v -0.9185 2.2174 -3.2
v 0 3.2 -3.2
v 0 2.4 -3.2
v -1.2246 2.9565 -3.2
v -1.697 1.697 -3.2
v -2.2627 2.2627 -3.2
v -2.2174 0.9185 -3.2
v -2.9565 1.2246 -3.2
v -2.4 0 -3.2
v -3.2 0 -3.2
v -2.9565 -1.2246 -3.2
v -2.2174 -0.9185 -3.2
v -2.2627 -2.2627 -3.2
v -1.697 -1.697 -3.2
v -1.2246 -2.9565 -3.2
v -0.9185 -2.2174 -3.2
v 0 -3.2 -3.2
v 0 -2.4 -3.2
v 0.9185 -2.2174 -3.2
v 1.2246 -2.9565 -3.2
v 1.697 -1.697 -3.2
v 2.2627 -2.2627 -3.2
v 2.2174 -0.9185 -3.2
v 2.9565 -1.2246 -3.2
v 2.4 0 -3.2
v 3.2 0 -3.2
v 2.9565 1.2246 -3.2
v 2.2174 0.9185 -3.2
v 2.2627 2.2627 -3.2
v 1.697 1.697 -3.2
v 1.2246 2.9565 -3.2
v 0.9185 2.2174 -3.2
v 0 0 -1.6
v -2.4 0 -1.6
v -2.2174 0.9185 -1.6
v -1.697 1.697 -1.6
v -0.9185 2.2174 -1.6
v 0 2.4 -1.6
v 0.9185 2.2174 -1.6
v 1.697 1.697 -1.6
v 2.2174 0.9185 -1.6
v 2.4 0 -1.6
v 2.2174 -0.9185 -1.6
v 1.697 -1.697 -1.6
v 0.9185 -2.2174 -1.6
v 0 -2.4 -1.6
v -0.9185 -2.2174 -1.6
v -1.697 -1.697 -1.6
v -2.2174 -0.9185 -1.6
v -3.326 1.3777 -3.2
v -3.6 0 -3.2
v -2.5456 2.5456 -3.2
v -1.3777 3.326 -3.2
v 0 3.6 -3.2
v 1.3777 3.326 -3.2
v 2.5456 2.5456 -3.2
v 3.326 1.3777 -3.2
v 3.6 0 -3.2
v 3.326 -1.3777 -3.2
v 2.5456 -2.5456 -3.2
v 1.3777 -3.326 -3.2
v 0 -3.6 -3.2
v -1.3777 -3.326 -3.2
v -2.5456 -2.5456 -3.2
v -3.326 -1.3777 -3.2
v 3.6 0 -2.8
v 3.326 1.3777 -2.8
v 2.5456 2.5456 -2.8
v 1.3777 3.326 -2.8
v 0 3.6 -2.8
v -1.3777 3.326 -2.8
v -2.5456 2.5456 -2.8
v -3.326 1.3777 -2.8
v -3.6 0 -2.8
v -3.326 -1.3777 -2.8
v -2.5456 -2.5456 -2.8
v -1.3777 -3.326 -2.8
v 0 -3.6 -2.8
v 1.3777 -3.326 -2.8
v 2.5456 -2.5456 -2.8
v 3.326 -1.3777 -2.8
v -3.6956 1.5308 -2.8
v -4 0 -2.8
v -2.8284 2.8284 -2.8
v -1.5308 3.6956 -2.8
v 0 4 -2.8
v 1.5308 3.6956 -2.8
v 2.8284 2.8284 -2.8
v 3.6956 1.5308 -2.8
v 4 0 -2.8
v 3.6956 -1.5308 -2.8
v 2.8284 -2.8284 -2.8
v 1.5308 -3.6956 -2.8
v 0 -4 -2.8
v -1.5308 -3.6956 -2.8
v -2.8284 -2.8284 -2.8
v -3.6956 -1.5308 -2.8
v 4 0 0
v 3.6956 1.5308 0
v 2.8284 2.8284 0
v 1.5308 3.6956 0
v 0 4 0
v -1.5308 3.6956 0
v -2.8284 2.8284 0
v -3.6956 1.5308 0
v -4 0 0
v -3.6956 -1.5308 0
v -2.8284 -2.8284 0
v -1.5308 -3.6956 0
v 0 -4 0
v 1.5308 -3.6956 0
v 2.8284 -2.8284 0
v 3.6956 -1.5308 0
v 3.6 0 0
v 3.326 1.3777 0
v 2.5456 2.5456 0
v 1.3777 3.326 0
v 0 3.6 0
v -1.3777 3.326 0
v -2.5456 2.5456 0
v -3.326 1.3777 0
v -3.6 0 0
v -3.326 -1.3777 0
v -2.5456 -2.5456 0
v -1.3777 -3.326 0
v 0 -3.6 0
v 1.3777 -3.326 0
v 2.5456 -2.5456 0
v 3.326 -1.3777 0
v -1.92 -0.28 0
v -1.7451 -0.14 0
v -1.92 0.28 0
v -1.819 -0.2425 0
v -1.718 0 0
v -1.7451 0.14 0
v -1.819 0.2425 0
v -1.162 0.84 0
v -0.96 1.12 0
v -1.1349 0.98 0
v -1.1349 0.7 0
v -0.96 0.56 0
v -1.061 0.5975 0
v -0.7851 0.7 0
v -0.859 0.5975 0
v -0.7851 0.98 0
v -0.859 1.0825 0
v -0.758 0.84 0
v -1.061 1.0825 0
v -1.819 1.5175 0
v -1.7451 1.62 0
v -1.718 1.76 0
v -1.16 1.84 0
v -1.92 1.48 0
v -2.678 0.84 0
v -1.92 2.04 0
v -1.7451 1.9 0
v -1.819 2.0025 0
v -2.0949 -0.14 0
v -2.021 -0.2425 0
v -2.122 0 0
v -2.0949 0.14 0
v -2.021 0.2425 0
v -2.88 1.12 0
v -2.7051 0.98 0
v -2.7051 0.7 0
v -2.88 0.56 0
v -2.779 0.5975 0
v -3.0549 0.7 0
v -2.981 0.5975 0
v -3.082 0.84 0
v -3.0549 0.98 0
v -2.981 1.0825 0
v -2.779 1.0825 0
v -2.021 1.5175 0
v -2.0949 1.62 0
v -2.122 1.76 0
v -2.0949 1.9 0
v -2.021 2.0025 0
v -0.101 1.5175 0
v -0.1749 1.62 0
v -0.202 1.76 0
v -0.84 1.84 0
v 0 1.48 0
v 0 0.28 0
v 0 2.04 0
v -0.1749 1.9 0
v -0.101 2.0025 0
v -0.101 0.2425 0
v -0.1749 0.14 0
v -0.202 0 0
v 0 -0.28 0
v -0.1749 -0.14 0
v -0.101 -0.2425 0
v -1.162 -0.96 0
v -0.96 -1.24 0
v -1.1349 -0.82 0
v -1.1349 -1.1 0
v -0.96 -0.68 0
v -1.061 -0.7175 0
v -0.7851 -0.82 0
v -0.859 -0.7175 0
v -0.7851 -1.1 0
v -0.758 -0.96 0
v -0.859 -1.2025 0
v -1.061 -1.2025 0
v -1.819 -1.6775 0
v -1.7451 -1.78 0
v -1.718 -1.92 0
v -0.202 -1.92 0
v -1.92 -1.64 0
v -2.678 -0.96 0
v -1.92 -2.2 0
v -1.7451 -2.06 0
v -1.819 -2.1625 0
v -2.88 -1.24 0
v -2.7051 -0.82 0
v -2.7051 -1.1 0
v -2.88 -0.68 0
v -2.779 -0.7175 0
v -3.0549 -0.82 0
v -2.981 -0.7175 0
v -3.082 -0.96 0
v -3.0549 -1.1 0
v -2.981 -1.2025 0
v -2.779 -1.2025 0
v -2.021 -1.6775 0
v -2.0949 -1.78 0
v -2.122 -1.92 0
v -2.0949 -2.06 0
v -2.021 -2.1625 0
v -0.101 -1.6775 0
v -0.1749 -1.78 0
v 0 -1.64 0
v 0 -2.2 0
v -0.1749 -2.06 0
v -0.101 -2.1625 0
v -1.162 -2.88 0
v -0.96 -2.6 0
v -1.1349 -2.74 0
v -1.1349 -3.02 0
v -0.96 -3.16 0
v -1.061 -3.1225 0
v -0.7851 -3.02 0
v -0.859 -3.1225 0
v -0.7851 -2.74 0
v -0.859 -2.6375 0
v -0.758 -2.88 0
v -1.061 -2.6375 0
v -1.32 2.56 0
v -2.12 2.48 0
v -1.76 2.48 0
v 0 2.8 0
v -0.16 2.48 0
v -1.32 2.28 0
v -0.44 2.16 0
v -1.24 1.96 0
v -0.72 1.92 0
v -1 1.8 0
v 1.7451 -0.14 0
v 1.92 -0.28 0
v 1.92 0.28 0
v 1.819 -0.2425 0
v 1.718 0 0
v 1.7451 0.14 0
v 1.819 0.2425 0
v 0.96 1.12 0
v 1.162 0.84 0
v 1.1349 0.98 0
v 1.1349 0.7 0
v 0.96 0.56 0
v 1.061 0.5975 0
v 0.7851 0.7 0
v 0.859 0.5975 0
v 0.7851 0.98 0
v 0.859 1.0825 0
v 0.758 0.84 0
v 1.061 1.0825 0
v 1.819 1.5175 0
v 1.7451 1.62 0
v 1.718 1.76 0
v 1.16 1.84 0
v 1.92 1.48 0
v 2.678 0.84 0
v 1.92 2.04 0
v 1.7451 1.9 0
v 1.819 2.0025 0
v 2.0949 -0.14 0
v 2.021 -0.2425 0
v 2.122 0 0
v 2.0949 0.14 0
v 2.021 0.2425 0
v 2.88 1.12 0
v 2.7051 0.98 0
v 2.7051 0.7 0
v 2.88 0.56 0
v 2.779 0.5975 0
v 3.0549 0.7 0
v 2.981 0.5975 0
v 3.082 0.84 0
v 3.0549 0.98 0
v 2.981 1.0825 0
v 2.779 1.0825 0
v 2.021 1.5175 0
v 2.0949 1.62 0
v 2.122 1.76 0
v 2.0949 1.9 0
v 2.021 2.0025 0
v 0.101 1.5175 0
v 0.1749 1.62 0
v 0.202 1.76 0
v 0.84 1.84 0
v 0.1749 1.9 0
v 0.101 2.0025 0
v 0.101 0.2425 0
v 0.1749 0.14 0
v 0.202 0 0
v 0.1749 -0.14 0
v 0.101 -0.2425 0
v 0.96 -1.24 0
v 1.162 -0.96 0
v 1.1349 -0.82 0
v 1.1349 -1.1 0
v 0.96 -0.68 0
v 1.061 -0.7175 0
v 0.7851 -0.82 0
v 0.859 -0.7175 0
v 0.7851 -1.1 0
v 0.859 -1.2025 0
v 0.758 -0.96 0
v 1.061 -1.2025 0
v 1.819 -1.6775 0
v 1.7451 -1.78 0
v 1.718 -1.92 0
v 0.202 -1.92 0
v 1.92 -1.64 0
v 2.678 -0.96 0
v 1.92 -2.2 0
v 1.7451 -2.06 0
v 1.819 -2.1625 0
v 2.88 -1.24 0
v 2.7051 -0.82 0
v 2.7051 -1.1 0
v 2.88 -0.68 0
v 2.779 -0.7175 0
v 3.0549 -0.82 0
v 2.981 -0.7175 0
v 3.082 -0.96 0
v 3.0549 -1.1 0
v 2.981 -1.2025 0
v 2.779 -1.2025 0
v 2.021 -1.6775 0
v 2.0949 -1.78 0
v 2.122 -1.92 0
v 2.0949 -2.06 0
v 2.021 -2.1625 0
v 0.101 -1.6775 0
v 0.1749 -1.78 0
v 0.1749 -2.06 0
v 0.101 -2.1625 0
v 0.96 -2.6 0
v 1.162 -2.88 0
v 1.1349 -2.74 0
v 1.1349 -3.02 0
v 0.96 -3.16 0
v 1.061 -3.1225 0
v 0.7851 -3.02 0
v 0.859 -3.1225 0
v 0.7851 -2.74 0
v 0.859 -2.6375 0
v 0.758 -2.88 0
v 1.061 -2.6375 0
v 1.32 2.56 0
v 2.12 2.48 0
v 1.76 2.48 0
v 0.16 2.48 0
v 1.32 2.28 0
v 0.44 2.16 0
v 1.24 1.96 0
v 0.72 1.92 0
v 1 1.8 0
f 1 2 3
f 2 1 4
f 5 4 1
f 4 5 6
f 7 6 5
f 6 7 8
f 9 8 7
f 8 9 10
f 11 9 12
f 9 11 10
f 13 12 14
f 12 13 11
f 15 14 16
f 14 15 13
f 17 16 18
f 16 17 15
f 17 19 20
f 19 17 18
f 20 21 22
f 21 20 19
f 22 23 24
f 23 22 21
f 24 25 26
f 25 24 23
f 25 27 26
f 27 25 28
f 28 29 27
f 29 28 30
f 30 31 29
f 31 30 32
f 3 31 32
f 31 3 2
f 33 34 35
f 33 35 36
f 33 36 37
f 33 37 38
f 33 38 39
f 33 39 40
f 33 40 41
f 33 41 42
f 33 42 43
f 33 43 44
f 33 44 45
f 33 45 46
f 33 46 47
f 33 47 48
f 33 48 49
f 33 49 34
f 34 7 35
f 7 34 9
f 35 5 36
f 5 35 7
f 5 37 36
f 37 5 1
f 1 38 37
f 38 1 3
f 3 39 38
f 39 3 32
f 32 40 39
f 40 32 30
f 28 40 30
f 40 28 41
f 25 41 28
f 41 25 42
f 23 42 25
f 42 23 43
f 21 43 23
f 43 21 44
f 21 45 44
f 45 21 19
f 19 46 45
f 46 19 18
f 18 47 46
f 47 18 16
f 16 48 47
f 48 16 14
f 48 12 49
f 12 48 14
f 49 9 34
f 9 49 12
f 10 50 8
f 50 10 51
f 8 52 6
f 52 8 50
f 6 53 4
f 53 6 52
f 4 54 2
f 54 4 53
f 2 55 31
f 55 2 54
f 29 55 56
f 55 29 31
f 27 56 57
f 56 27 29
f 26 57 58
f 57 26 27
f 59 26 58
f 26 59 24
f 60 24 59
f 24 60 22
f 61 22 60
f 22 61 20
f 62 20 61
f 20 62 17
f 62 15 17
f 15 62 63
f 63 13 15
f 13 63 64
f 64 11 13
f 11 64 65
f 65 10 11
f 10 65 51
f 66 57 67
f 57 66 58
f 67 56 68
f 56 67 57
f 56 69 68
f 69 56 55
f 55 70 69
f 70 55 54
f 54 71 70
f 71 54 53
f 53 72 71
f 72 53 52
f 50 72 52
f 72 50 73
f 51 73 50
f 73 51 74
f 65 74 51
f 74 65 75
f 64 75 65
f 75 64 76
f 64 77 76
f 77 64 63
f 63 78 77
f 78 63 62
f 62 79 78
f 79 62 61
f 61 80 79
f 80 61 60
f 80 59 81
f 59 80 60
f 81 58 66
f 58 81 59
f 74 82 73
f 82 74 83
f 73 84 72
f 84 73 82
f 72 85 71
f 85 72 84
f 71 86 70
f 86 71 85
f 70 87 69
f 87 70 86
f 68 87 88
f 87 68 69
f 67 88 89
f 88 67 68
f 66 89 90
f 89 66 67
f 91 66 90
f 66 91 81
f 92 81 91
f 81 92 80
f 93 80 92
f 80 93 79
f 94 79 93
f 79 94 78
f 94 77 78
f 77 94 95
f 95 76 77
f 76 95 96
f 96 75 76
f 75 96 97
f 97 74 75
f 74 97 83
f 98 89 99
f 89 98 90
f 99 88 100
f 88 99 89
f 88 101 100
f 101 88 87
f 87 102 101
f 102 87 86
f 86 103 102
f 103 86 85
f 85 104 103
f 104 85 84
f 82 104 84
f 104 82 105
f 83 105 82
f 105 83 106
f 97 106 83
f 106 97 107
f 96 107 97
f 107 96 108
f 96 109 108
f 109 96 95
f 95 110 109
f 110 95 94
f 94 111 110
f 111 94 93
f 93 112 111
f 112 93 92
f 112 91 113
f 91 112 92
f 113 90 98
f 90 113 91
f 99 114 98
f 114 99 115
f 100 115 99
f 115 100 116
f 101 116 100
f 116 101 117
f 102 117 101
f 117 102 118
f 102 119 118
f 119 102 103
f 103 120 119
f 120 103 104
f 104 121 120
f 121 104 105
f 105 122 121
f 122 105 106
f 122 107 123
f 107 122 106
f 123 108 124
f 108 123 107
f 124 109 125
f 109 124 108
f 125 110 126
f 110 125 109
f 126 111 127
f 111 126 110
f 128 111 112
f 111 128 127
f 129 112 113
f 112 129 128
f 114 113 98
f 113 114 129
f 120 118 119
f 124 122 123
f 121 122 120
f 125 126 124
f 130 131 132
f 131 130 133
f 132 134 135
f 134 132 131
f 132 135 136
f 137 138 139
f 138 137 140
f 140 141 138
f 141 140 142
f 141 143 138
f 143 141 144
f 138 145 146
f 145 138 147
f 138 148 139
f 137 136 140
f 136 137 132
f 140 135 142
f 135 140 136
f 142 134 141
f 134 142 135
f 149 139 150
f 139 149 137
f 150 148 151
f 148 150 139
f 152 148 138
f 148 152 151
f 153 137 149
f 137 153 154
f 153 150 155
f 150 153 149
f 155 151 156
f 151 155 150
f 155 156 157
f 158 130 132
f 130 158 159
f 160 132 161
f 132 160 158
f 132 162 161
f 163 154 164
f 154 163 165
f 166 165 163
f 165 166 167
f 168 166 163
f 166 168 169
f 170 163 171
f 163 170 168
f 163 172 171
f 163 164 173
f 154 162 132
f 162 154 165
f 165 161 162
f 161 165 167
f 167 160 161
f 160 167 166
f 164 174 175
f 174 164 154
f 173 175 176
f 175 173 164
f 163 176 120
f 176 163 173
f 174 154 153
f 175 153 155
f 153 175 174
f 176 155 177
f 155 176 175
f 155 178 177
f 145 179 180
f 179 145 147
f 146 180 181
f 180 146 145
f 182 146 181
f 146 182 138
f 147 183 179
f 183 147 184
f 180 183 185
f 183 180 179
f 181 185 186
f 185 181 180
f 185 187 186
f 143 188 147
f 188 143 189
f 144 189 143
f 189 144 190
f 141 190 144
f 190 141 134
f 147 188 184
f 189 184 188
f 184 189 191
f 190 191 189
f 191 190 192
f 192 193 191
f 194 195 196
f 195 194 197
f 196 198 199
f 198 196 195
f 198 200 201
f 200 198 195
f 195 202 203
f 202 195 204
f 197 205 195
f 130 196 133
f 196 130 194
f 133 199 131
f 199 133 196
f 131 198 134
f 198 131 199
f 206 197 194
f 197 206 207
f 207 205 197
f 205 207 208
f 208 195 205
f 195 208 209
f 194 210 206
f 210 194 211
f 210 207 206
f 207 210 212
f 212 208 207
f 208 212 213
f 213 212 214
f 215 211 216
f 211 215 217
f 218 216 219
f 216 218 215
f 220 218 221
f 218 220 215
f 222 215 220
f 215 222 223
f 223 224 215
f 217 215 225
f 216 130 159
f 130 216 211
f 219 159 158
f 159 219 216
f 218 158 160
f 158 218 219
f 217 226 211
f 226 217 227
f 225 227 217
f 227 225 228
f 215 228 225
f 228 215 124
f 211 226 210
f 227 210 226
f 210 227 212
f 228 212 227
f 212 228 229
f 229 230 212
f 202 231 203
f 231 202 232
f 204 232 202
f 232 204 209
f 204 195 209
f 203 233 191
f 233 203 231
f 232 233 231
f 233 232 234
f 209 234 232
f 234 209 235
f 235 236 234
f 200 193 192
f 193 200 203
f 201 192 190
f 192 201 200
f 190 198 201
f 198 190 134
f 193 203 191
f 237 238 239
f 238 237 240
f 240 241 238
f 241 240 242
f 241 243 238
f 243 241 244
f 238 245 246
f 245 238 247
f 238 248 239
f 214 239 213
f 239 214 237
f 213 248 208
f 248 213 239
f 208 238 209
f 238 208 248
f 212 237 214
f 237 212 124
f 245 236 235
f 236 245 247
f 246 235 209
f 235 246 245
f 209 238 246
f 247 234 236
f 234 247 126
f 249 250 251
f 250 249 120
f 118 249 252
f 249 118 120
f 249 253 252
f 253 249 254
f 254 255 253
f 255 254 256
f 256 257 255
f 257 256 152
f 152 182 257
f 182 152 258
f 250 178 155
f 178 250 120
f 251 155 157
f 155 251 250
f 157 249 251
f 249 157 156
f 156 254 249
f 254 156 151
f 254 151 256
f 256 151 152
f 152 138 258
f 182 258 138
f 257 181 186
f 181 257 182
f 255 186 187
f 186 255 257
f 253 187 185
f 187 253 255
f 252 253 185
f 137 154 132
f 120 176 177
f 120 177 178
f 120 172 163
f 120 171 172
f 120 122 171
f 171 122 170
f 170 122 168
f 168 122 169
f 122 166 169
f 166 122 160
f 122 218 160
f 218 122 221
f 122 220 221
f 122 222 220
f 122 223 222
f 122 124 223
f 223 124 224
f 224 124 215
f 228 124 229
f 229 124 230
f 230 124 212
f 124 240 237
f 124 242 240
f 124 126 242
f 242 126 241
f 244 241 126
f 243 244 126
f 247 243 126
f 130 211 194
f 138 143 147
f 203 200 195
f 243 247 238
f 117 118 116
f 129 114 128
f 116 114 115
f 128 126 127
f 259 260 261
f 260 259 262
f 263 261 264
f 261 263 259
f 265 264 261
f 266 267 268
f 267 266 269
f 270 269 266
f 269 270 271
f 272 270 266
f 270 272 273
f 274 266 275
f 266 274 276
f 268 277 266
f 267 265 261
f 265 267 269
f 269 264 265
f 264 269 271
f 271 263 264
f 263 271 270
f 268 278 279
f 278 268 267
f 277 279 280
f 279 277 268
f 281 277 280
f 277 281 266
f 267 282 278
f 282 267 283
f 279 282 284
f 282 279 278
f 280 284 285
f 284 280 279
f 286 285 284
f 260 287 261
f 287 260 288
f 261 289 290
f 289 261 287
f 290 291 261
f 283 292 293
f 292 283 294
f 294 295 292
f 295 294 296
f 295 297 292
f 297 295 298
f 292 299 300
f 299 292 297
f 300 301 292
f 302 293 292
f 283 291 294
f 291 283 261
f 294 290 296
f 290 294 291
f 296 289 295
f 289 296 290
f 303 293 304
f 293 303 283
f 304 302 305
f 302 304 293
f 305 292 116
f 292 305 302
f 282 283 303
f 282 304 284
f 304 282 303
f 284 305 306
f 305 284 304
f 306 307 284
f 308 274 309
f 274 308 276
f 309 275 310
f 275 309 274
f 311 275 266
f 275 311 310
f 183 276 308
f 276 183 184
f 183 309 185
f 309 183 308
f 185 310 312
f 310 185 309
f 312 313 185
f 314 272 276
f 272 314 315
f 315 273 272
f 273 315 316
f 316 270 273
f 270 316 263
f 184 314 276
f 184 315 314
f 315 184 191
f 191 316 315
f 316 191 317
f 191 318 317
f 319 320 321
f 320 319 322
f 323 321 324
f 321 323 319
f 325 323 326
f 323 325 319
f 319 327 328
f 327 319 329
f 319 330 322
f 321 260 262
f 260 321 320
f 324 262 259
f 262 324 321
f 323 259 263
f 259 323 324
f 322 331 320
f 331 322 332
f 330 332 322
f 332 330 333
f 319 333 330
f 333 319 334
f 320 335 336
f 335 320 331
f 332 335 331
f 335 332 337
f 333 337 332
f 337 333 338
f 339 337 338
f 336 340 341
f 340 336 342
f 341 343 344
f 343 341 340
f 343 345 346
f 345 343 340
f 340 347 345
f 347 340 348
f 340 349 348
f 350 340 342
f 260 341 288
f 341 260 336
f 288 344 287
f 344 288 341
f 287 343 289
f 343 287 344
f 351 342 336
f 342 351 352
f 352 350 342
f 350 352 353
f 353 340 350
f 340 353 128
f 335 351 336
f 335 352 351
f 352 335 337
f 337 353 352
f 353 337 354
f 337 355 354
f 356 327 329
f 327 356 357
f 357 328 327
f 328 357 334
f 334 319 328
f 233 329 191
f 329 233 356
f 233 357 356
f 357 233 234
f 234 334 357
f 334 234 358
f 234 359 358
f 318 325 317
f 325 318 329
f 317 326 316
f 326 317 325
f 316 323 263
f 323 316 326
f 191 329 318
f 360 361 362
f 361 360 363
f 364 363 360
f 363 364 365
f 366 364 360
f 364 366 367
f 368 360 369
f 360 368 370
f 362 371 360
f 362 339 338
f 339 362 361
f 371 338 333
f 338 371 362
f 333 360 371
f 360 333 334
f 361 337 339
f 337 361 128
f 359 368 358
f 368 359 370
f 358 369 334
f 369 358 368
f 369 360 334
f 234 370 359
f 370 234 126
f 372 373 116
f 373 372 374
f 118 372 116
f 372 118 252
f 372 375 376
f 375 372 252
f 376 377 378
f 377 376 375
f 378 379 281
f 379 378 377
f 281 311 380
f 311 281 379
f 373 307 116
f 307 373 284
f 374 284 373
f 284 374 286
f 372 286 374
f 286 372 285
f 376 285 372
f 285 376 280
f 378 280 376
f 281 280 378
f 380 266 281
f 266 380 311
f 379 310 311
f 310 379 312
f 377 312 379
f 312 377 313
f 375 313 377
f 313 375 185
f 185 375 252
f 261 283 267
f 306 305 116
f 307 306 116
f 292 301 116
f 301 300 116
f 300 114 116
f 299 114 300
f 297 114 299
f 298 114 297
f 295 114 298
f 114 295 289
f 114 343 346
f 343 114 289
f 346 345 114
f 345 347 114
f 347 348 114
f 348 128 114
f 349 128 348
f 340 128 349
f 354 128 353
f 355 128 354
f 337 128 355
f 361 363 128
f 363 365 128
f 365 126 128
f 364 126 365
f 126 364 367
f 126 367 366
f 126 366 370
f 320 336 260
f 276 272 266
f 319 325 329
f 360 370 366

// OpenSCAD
// file: ../p/4-4disc.scad
use <../lib.scad>
function ldraw_lib__4_4disc() = [
// 0 Disc 1.0
// 0 Name: 4-4disc.dat
// 0 Author: James Jessiman
// 0 !LDRAW_ORG Primitive UPDATE 2002-02
// 0 !LICENSE Licensed under CC BY 4.0 : see CAreadme.txt
// 
// 0 BFC CERTIFY CCW
  [0,"BFC","CERTIFY"],
  [0,"BFC","CCW"],
// 
// 0 !HISTORY 1998-12-15 [PTadmin] Official Update 1998-10
// 0 !HISTORY 2002-03-23 [sbliss] Added BFC statement
// 0 !HISTORY 2002-04-25 [PTadmin] Official Update 2002-02
// 0 !HISTORY 2007-06-24 [PTadmin] Header formatted for Contributor Agreement
// 0 !HISTORY 2008-07-01 [PTadmin] Official Update 2008-01
// 
// 
// 3 16 0 0 0 1 0 0 0.9239 0 0.3827
  [3,16,0,0,0,1,0,0,0.9239,0,0.3827],
// 3 16 0 0 0 0.9239 0 0.3827 0.7071 0 0.7071
  [3,16,0,0,0,0.9239,0,0.3827,0.7071,0,0.7071],
// 3 16 0 0 0 0.7071 0 0.7071 0.3827 0 0.9239
  [3,16,0,0,0,0.7071,0,0.7071,0.3827,0,0.9239],
// 3 16 0 0 0 0.3827 0 0.9239 0 0 1
  [3,16,0,0,0,0.3827,0,0.9239,0,0,1],
// 3 16 0 0 0 0 0 1 -0.3827 0 0.9239
  [3,16,0,0,0,0,0,1,-0.3827,0,0.9239],
// 3 16 0 0 0 -0.3827 0 0.9239 -0.7071 0 0.7071
  [3,16,0,0,0,-0.3827,0,0.9239,-0.7071,0,0.7071],
// 3 16 0 0 0 -0.7071 0 0.7071 -0.9239 0 0.3827
  [3,16,0,0,0,-0.7071,0,0.7071,-0.9239,0,0.3827],
// 3 16 0 0 0 -0.9239 0 0.3827 -1 0 -0
  [3,16,0,0,0,-0.9239,0,0.3827,-1,0,-0],
// 3 16 0 0 0 -1 0 -0 -0.9239 0 -0.3827
  [3,16,0,0,0,-1,0,-0,-0.9239,0,-0.3827],
// 3 16 0 0 0 -0.9239 0 -0.3827 -0.7071 0 -0.7071
  [3,16,0,0,0,-0.9239,0,-0.3827,-0.7071,0,-0.7071],
// 3 16 0 0 0 -0.7071 0 -0.7071 -0.3827 0 -0.9239
  [3,16,0,0,0,-0.7071,0,-0.7071,-0.3827,0,-0.9239],
// 3 16 0 0 0 -0.3827 0 -0.9239 0 0 -1
  [3,16,0,0,0,-0.3827,0,-0.9239,0,0,-1],
// 3 16 0 0 0 0 0 -1 0.3827 0 -0.9239
  [3,16,0,0,0,0,0,-1,0.3827,0,-0.9239],
// 3 16 0 0 0 0.3827 0 -0.9239 0.7071 0 -0.7071
  [3,16,0,0,0,0.3827,0,-0.9239,0.7071,0,-0.7071],
// 3 16 0 0 0 0.7071 0 -0.7071 0.9239 0 -0.3827
  [3,16,0,0,0,0.7071,0,-0.7071,0.9239,0,-0.3827],
// 3 16 0 0 0 0.9239 0 -0.3827 1 0 0
  [3,16,0,0,0,0.9239,0,-0.3827,1,0,0],
// 0
];
module ldraw_lib__4_4disc(step=0, col=false, unit=2/5, alt=false, line=0.2, solid=!$preview)
    makepoly(ldraw_lib__4_4disc(), step=step, col=col, unit=unit, alt=alt, line=line, solid=solid);
ldraw_lib__4_4disc(line=0.2);
// file: ../p/4-4ring3.scad
use <../lib.scad>
function ldraw_lib__4_4ring3() = [
// 0 Ring  3 x 1.0
// 0 Name: 4-4ring3.dat
// 0 Author: James Jessiman
// 0 !LDRAW_ORG Primitive UPDATE 2009-01
// 0 !LICENSE Licensed under CC BY 4.0 : see CAreadme.txt
// 
// 0 BFC CERTIFY CCW
  [0,"BFC","CERTIFY"],
  [0,"BFC","CCW"],
// 
// 0 !HISTORY 1998-12-15 [PTadmin] Official Update 1998-10
// 0 !HISTORY 2002-04-05 [hafhead] Added BFC statement
// 0 !HISTORY 2002-04-25 [PTadmin] Official Update 2002-02
// 0 !HISTORY 2007-06-24 [PTadmin] Header formatted for Contributor Agreement
// 0 !HISTORY 2008-07-01 [PTadmin] Official Update 2008-01
// 0 !HISTORY 2008-08-26 [cwdee] Switch polygon winding and rename
// 0 !HISTORY 2009-05-02 [PTadmin] Official Update 2009-01
// 
// 
// 4 16 -1.5308 0 3.6956 -1.1481 0 2.7717 0 0 3 0 0 4
  [4,16,-1.5308,0,3.6956,-1.1481,0,2.7717,0,0,3,0,0,4],
// 4 16 -2.8284 0 2.8284 -2.1213 0 2.1213 -1.1481 0 2.7717 -1.5308 0 3.6956
  [4,16,-2.8284,0,2.8284,-2.1213,0,2.1213,-1.1481,0,2.7717,-1.5308,0,3.6956],
// 4 16 -3.6956 0 1.5308 -2.7717 0 1.1481 -2.1213 0 2.1213 -2.8284 0 2.8284
  [4,16,-3.6956,0,1.5308,-2.7717,0,1.1481,-2.1213,0,2.1213,-2.8284,0,2.8284],
// 4 16 -4 0 0 -3 0 0 -2.7717 0 1.1481 -3.6956 0 1.5308
  [4,16,-4,0,0,-3,0,0,-2.7717,0,1.1481,-3.6956,0,1.5308],
// 4 16 -3.6956 0 -1.5308 -2.7717 0 -1.1481 -3 0 0 -4 0 0
  [4,16,-3.6956,0,-1.5308,-2.7717,0,-1.1481,-3,0,0,-4,0,0],
// 4 16 -2.8284 0 -2.8284 -2.1213 0 -2.1213 -2.7717 0 -1.1481 -3.6956 0 -1.5308
  [4,16,-2.8284,0,-2.8284,-2.1213,0,-2.1213,-2.7717,0,-1.1481,-3.6956,0,-1.5308],
// 4 16 -1.5308 0 -3.6956 -1.1481 0 -2.7717 -2.1213 0 -2.1213 -2.8284 0 -2.8284
  [4,16,-1.5308,0,-3.6956,-1.1481,0,-2.7717,-2.1213,0,-2.1213,-2.8284,0,-2.8284],
// 4 16 0 0 -4 0 0 -3 -1.1481 0 -2.7717 -1.5308 0 -3.6956
  [4,16,0,0,-4,0,0,-3,-1.1481,0,-2.7717,-1.5308,0,-3.6956],
// 4 16 1.5308 0 -3.6956 1.1481 0 -2.7717 0 0 -3 0 0 -4
  [4,16,1.5308,0,-3.6956,1.1481,0,-2.7717,0,0,-3,0,0,-4],
// 4 16 2.8284 0 -2.8284 2.1213 0 -2.1213 1.1481 0 -2.7717 1.5308 0 -3.6956
  [4,16,2.8284,0,-2.8284,2.1213,0,-2.1213,1.1481,0,-2.7717,1.5308,0,-3.6956],
// 4 16 3.6956 0 -1.5308 2.7717 0 -1.1481 2.1213 0 -2.1213 2.8284 0 -2.8284
  [4,16,3.6956,0,-1.5308,2.7717,0,-1.1481,2.1213,0,-2.1213,2.8284,0,-2.8284],
// 4 16 4 0 0 3 0 0 2.7717 0 -1.1481 3.6956 0 -1.5308
  [4,16,4,0,0,3,0,0,2.7717,0,-1.1481,3.6956,0,-1.5308],
// 4 16 3.6956 0 1.5308 2.7717 0 1.1481 3 0 0 4 0 0
  [4,16,3.6956,0,1.5308,2.7717,0,1.1481,3,0,0,4,0,0],
// 4 16 2.8284 0 2.8284 2.1213 0 2.1213 2.7717 0 1.1481 3.6956 0 1.5308
  [4,16,2.8284,0,2.8284,2.1213,0,2.1213,2.7717,0,1.1481,3.6956,0,1.5308],
// 4 16 1.5308 0 3.6956 1.1481 0 2.7717 2.1213 0 2.1213 2.8284 0 2.8284
  [4,16,1.5308,0,3.6956,1.1481,0,2.7717,2.1213,0,2.1213,2.8284,0,2.8284],
// 4 16 0 0 4 0 0 3 1.1481 0 2.7717 1.5308 0 3.6956
  [4,16,0,0,4,0,0,3,1.1481,0,2.7717,1.5308,0,3.6956],
// 0
];
module ldraw_lib__4_4ring3(step=0, col=false, unit=2/5, alt=false, line=0.2, solid=!$preview)
    makepoly(ldraw_lib__4_4ring3(), step=step, col=col, unit=unit, alt=alt, line=line, solid=solid);
ldraw_lib__4_4ring3(line=0.2);
// file: ../p/4-4cylc.scad
use <../lib.scad>
use <4-4cyli.scad>
use <4-4disc.scad>
use <4-4edge.scad>
function ldraw_lib__4_4cylc() = [
// 0 Cylinder Closed 1.0
// 0 Name: 4-4cylc.dat
// 0 Author: Alex Taylor [anathema]
// 0 !LDRAW_ORG Primitive UPDATE 2009-02
// 0 !LICENSE Licensed under CC BY 4.0 : see CAreadme.txt
// 
// 0 BFC CERTIFY CCW
  [0,"BFC","CERTIFY"],
  [0,"BFC","CCW"],
// 
// 0 !HISTORY 2008-12-29 [cwdee] Removed one disc
// 0 !HISTORY 2009-09-03 [PTadmin] Official Update 2009-02
// 
// 
// 1 16 0 0 0 1 0 0 0 1 0 0 0 1 4-4edge.dat
  [1,16,0,0,0,1,0,0,0,1,0,0,0,1, ldraw_lib__4_4edge()],
// 1 16 0 1 0 1 0 0 0 1 0 0 0 1 4-4edge.dat
  [1,16,0,1,0,1,0,0,0,1,0,0,0,1, ldraw_lib__4_4edge()],
// 1 16 0 0 0 1 0 0 0 1 0 0 0 1 4-4disc.dat
  [1,16,0,0,0,1,0,0,0,1,0,0,0,1, ldraw_lib__4_4disc()],
// 1 16 0 0 0 1 0 0 0 1 0 0 0 1 4-4cyli.dat
  [1,16,0,0,0,1,0,0,0,1,0,0,0,1, ldraw_lib__4_4cyli()],
// 0
];
module ldraw_lib__4_4cylc(step=0, col=false, unit=2/5, alt=false, line=0.2, solid=!$preview)
    makepoly(ldraw_lib__4_4cylc(), step=step, col=col, unit=unit, alt=alt, line=line, solid=solid);
ldraw_lib__4_4cylc(line=0.2);
// file: ../p/4-4edge.scad
use <../lib.scad>
function ldraw_lib__4_4edge() = [
// 0 Circle 1.0
// 0 Name: 4-4edge.dat
// 0 Author: James Jessiman
// 0 !LDRAW_ORG Primitive UPDATE 2017-01
// 0 !LICENSE Licensed under CC BY 4.0 : see CAreadme.txt
// 
// 0 BFC CERTIFY CCW
  [0,"BFC","CERTIFY"],
  [0,"BFC","CCW"],
// 
// 0 !HISTORY 1998-12-15 [PTadmin] Official Update 1998-10
// 0 !HISTORY 2005-12-28 [PTadmin] Official Update 2005-01
// 0 !HISTORY 2007-06-24 [PTadmin] Header formatted for Contributor Agreement
// 0 !HISTORY 2008-07-01 [PTadmin] Official Update 2008-01
// 0 !HISTORY 2017-01-15 [Steffen] BFCed
// 0 !HISTORY 2017-12-30 [PTadmin] Official Update 2017-01
// 
// 
// 2 24 1 0 0 0.9239 0 0.3827
  [2,24,1,0,0,0.9239,0,0.3827],
// 2 24 0.9239 0 0.3827 0.7071 0 0.7071
  [2,24,0.9239,0,0.3827,0.7071,0,0.7071],
// 2 24 0.7071 0 0.7071 0.3827 0 0.9239
  [2,24,0.7071,0,0.7071,0.3827,0,0.9239],
// 2 24 0.3827 0 0.9239 0 0 1
  [2,24,0.3827,0,0.9239,0,0,1],
// 2 24 0 0 1 -0.3827 0 0.9239
  [2,24,0,0,1,-0.3827,0,0.9239],
// 2 24 -0.3827 0 0.9239 -0.7071 0 0.7071
  [2,24,-0.3827,0,0.9239,-0.7071,0,0.7071],
// 2 24 -0.7071 0 0.7071 -0.9239 0 0.3827
  [2,24,-0.7071,0,0.7071,-0.9239,0,0.3827],
// 2 24 -0.9239 0 0.3827 -1 0 -0
  [2,24,-0.9239,0,0.3827,-1,0,-0],
// 2 24 -1 0 -0 -0.9239 0 -0.3827
  [2,24,-1,0,-0,-0.9239,0,-0.3827],
// 2 24 -0.9239 0 -0.3827 -0.7071 0 -0.7071
  [2,24,-0.9239,0,-0.3827,-0.7071,0,-0.7071],
// 2 24 -0.7071 0 -0.7071 -0.3827 0 -0.9239
  [2,24,-0.7071,0,-0.7071,-0.3827,0,-0.9239],
// 2 24 -0.3827 0 -0.9239 0 0 -1
  [2,24,-0.3827,0,-0.9239,0,0,-1],
// 2 24 0 0 -1 0.3827 0 -0.9239
  [2,24,0,0,-1,0.3827,0,-0.9239],
// 2 24 0.3827 0 -0.9239 0.7071 0 -0.7071
  [2,24,0.3827,0,-0.9239,0.7071,0,-0.7071],
// 2 24 0.7071 0 -0.7071 0.9239 0 -0.3827
  [2,24,0.7071,0,-0.7071,0.9239,0,-0.3827],
// 2 24 0.9239 0 -0.3827 1 0 0
  [2,24,0.9239,0,-0.3827,1,0,0],
];
module ldraw_lib__4_4edge(step=0, col=false, unit=2/5, alt=false, line=0.2, solid=!$preview)
    makepoly(ldraw_lib__4_4edge(), step=step, col=col, unit=unit, alt=alt, line=line, solid=solid);
ldraw_lib__4_4edge(line=0.2);
// file: ../p/4-4cyli.scad
use <../lib.scad>
function ldraw_lib__4_4cyli() = [
// 0 Cylinder 1.0
// 0 Name: 4-4cyli.dat
// 0 Author: James Jessiman
// 0 !LDRAW_ORG Primitive UPDATE 2005-01
// 0 !LICENSE Licensed under CC BY 4.0 : see CAreadme.txt
// 
// 0 BFC CERTIFY CCW
  [0,"BFC","CERTIFY"],
  [0,"BFC","CCW"],
// 
// 0 !HISTORY 1998-12-15 [PTadmin] Official Update 1998-10
// 0 !HISTORY 2002-03-23 [sbliss] Added BFC statement; merged headers from files in distributions LDraw 0.27 and Complete.
// 0 !HISTORY 2002-04-25 [PTadmin] Official Update 2002-02
// 0 !HISTORY 2004-12-14 [guyvivan] BFC CCW
// 0 !HISTORY 2005-12-28 [PTadmin] Official Update 2005-01
// 0 !HISTORY 2007-06-24 [PTadmin] Header formatted for Contributor Agreement
// 0 !HISTORY 2008-07-01 [PTadmin] Official Update 2008-01
// 
// 
// 4 16 1 1 0 0.9239 1 0.3827 0.9239 0 0.3827 1 0 0
  [4,16,1,1,0,0.9239,1,0.3827,0.9239,0,0.3827,1,0,0],
// 5 24 1 0 0 1 1 0 0.9239 0 0.3827 0.9239 0 -0.3827
  [5,24,1,0,0,1,1,0,0.9239,0,0.3827,0.9239,0,-0.3827],
// 4 16 0.9239 1 0.3827 0.7071 1 0.7071 0.7071 0 0.7071 0.9239 0 0.3827
  [4,16,0.9239,1,0.3827,0.7071,1,0.7071,0.7071,0,0.7071,0.9239,0,0.3827],
// 5 24 0.9239 0 0.3827 0.9239 1 0.3827 0.7071 0 0.7071 1 0 0
  [5,24,0.9239,0,0.3827,0.9239,1,0.3827,0.7071,0,0.7071,1,0,0],
// 4 16 0.7071 1 0.7071 0.3827 1 0.9239 0.3827 0 0.9239 0.7071 0 0.7071
  [4,16,0.7071,1,0.7071,0.3827,1,0.9239,0.3827,0,0.9239,0.7071,0,0.7071],
// 5 24 0.7071 0 0.7071 0.7071 1 0.7071 0.3827 0 0.9239 0.9239 0 0.3827
  [5,24,0.7071,0,0.7071,0.7071,1,0.7071,0.3827,0,0.9239,0.9239,0,0.3827],
// 4 16 0.3827 1 0.9239 0 1 1 0 0 1 0.3827 0 0.9239
  [4,16,0.3827,1,0.9239,0,1,1,0,0,1,0.3827,0,0.9239],
// 5 24 0.3827 0 0.9239 0.3827 1 0.9239 0 0 1 0.7071 0 0.7071
  [5,24,0.3827,0,0.9239,0.3827,1,0.9239,0,0,1,0.7071,0,0.7071],
// 4 16 0 1 1 -0.3827 1 0.9239 -0.3827 0 0.9239 0 0 1
  [4,16,0,1,1,-0.3827,1,0.9239,-0.3827,0,0.9239,0,0,1],
// 5 24 0 0 1 0 1 1 -0.3827 0 0.9239 0.3827 0 0.9239
  [5,24,0,0,1,0,1,1,-0.3827,0,0.9239,0.3827,0,0.9239],
// 4 16 -0.3827 1 0.9239 -0.7071 1 0.7071 -0.7071 0 0.7071 -0.3827 0 0.9239
  [4,16,-0.3827,1,0.9239,-0.7071,1,0.7071,-0.7071,0,0.7071,-0.3827,0,0.9239],
// 5 24 -0.3827 0 0.9239 -0.3827 1 0.9239 -0.7071 0 0.7071 0 0 1
  [5,24,-0.3827,0,0.9239,-0.3827,1,0.9239,-0.7071,0,0.7071,0,0,1],
// 4 16 -0.7071 1 0.7071 -0.9239 1 0.3827 -0.9239 0 0.3827 -0.7071 0 0.7071
  [4,16,-0.7071,1,0.7071,-0.9239,1,0.3827,-0.9239,0,0.3827,-0.7071,0,0.7071],
// 5 24 -0.7071 0 0.7071 -0.7071 1 0.7071 -0.9239 0 0.3827 -0.3827 0 0.9239
  [5,24,-0.7071,0,0.7071,-0.7071,1,0.7071,-0.9239,0,0.3827,-0.3827,0,0.9239],
// 4 16 -0.9239 1 0.3827 -1 1 0 -1 0 0 -0.9239 0 0.3827
  [4,16,-0.9239,1,0.3827,-1,1,0,-1,0,0,-0.9239,0,0.3827],
// 5 24 -0.9239 0 0.3827 -0.9239 1 0.3827 -1 0 0 -0.7071 0 0.7071
  [5,24,-0.9239,0,0.3827,-0.9239,1,0.3827,-1,0,0,-0.7071,0,0.7071],
// 4 16 -1 1 0 -0.9239 1 -0.3827 -0.9239 0 -0.3827 -1 0 0
  [4,16,-1,1,0,-0.9239,1,-0.3827,-0.9239,0,-0.3827,-1,0,0],
// 5 24 -1 0 0 -1 1 0 -0.9239 0 -0.3827 -0.9239 0 0.3827
  [5,24,-1,0,0,-1,1,0,-0.9239,0,-0.3827,-0.9239,0,0.3827],
// 4 16 -0.9239 1 -0.3827 -0.7071 1 -0.7071 -0.7071 0 -0.7071 -0.9239 0 -0.3827
  [4,16,-0.9239,1,-0.3827,-0.7071,1,-0.7071,-0.7071,0,-0.7071,-0.9239,0,-0.3827],
// 5 24 -0.9239 0 -0.3827 -0.9239 1 -0.3827 -0.7071 0 -0.7071 -1 0 0
  [5,24,-0.9239,0,-0.3827,-0.9239,1,-0.3827,-0.7071,0,-0.7071,-1,0,0],
// 4 16 -0.7071 1 -0.7071 -0.3827 1 -0.9239 -0.3827 0 -0.9239 -0.7071 0 -0.7071
  [4,16,-0.7071,1,-0.7071,-0.3827,1,-0.9239,-0.3827,0,-0.9239,-0.7071,0,-0.7071],
// 5 24 -0.7071 0 -0.7071 -0.7071 1 -0.7071 -0.3827 0 -0.9239 -0.9239 0 -0.3827
  [5,24,-0.7071,0,-0.7071,-0.7071,1,-0.7071,-0.3827,0,-0.9239,-0.9239,0,-0.3827],
// 4 16 -0.3827 1 -0.9239 0 1 -1 0 0 -1 -0.3827 0 -0.9239
  [4,16,-0.3827,1,-0.9239,0,1,-1,0,0,-1,-0.3827,0,-0.9239],
// 5 24 -0.3827 0 -0.9239 -0.3827 1 -0.9239 0 0 -1 -0.7071 0 -0.7071
  [5,24,-0.3827,0,-0.9239,-0.3827,1,-0.9239,0,0,-1,-0.7071,0,-0.7071],
// 4 16 0 1 -1 0.3827 1 -0.9239 0.3827 0 -0.9239 0 0 -1
  [4,16,0,1,-1,0.3827,1,-0.9239,0.3827,0,-0.9239,0,0,-1],
// 5 24 0 0 -1 0 1 -1 0.3827 0 -0.9239 -0.3827 0 -0.9239
  [5,24,0,0,-1,0,1,-1,0.3827,0,-0.9239,-0.3827,0,-0.9239],
// 4 16 0.3827 1 -0.9239 0.7071 1 -0.7071 0.7071 0 -0.7071 0.3827 0 -0.9239
  [4,16,0.3827,1,-0.9239,0.7071,1,-0.7071,0.7071,0,-0.7071,0.3827,0,-0.9239],
// 5 24 0.3827 0 -0.9239 0.3827 1 -0.9239 0.7071 0 -0.7071 0 0 -1
  [5,24,0.3827,0,-0.9239,0.3827,1,-0.9239,0.7071,0,-0.7071,0,0,-1],
// 4 16 0.7071 1 -0.7071 0.9239 1 -0.3827 0.9239 0 -0.3827 0.7071 0 -0.7071
  [4,16,0.7071,1,-0.7071,0.9239,1,-0.3827,0.9239,0,-0.3827,0.7071,0,-0.7071],
// 5 24 0.7071 0 -0.7071 0.7071 1 -0.7071 0.9239 0 -0.3827 0.3827 0 -0.9239
  [5,24,0.7071,0,-0.7071,0.7071,1,-0.7071,0.9239,0,-0.3827,0.3827,0,-0.9239],
// 4 16 0.9239 1 -0.3827 1 1 0 1 0 0 0.9239 0 -0.3827
  [4,16,0.9239,1,-0.3827,1,1,0,1,0,0,0.9239,0,-0.3827],
// 5 24 0.9239 0 -0.3827 0.9239 1 -0.3827 1 0 0 0.7071 0 -0.7071
  [5,24,0.9239,0,-0.3827,0.9239,1,-0.3827,1,0,0,0.7071,0,-0.7071],
// 0
];
module ldraw_lib__4_4cyli(step=0, col=false, unit=2/5, alt=false, line=0.2, solid=!$preview)
    makepoly(ldraw_lib__4_4cyli(), step=step, col=col, unit=unit, alt=alt, line=line, solid=solid);
ldraw_lib__4_4cyli(line=0.2);
// file: ../p/stud4o.scad
use <../lib.scad>
use <4-4cylc.scad>
use <4-4ring3.scad>
function ldraw_lib__stud4o() = [
// 0 Stud Tube Open without Outer Cylinder
// 0 Name: stud4o.dat
// 0 Author: Magnus Forsberg [MagFors]
// 0 !LDRAW_ORG Primitive UPDATE 2011-02
// 0 !LICENSE Licensed under CC BY 4.0 : see CAreadme.txt
// 
// 0 !HELP This stud is a "antistud" to be used like a underside stud,
// 0 !HELP but without the outer cylinder.
// 0 !HELP 1 47 0 0 0 1 0 0 0 1 0 0 0 1 stud4.dat
// 
// 0 BFC CERTIFY CCW
  [0,"BFC","CERTIFY"],
  [0,"BFC","CCW"],
// 
// 0 !HISTORY 2011-12-29 [PTadmin] Official Update 2011-02
// 
// 
// 1 16 0 -4 0 2 0 0 0 1 0 0 0 2 4-4ring3.dat
  [1,16,0,-4,0,2,0,0,0,1,0,0,0,2, ldraw_lib__4_4ring3()],
// 0 BFC INVERTNEXT
  [0,"BFC","INVERTNEXT"],
// 1 16 0 0 0 -6 0 0 0 -4 0 0 0 6 4-4cylc.dat
  [1,16,0,0,0,-6,0,0,0,-4,0,0,0,6, ldraw_lib__4_4cylc()],
];
module ldraw_lib__stud4o(step=0, col=false, unit=2/5, alt=false, line=0.2, solid=!$preview)
    makepoly(ldraw_lib__stud4o(), step=step, col=col, unit=unit, alt=alt, line=line, solid=solid);
ldraw_lib__stud4o(line=0.2);
// file: ../p/4-4ring8.scad
use <../lib.scad>
function ldraw_lib__4_4ring8() = [
// 0 Ring  8 x 1.0
// 0 Name: 4-4ring8.dat
// 0 Author: Steffen [Steffen]
// 0 !LDRAW_ORG Primitive UPDATE 2012-01
// 0 !LICENSE Licensed under CC BY 4.0 : see CAreadme.txt
// 
// 0 BFC CERTIFY CCW
  [0,"BFC","CERTIFY"],
  [0,"BFC","CCW"],
// 
// 0 !HISTORY 2003-12-19 [PTadmin] Official Update 2003-03
// 0 !HISTORY 2007-06-24 [PTadmin] Header formatted for Contributor Agreement
// 0 !HISTORY 2008-07-01 [PTadmin] Official Update 2008-01
// 0 !HISTORY 2012-02-16 [Philo] Changed to CCW
// 0 !HISTORY 2012-03-30 [PTadmin] Official Update 2012-01
// 
// 
// 4 16 9 0 0 8.3151 0 3.4443 7.3912 0 3.0616 8 0 0
  [4,16,9,0,0,8.3151,0,3.4443,7.3912,0,3.0616,8,0,0],
// 4 16 8.3151 0 3.4443 6.3639 0 6.3639 5.6568 0 5.6568 7.3912 0 3.0616
  [4,16,8.3151,0,3.4443,6.3639,0,6.3639,5.6568,0,5.6568,7.3912,0,3.0616],
// 4 16 6.3639 0 6.3639 3.4443 0 8.3151 3.0616 0 7.3912 5.6568 0 5.6568
  [4,16,6.3639,0,6.3639,3.4443,0,8.3151,3.0616,0,7.3912,5.6568,0,5.6568],
// 4 16 3.4443 0 8.3151 0 0 9 0 0 8 3.0616 0 7.3912
  [4,16,3.4443,0,8.3151,0,0,9,0,0,8,3.0616,0,7.3912],
// 4 16 0 0 9 -3.4443 0 8.3151 -3.0616 0 7.3912 0 0 8
  [4,16,0,0,9,-3.4443,0,8.3151,-3.0616,0,7.3912,0,0,8],
// 4 16 -3.4443 0 8.3151 -6.3639 0 6.3639 -5.6568 0 5.6568 -3.0616 0 7.3912
  [4,16,-3.4443,0,8.3151,-6.3639,0,6.3639,-5.6568,0,5.6568,-3.0616,0,7.3912],
// 4 16 -6.3639 0 6.3639 -8.3151 0 3.4443 -7.3912 0 3.0616 -5.6568 0 5.6568
  [4,16,-6.3639,0,6.3639,-8.3151,0,3.4443,-7.3912,0,3.0616,-5.6568,0,5.6568],
// 4 16 -8.3151 0 3.4443 -9 0 0 -8 0 0 -7.3912 0 3.0616
  [4,16,-8.3151,0,3.4443,-9,0,0,-8,0,0,-7.3912,0,3.0616],
// 4 16 -9 0 0 -8.3151 0 -3.4443 -7.3912 0 -3.0616 -8 0 0
  [4,16,-9,0,0,-8.3151,0,-3.4443,-7.3912,0,-3.0616,-8,0,0],
// 4 16 -8.3151 0 -3.4443 -6.3639 0 -6.3639 -5.6568 0 -5.6568 -7.3912 0 -3.0616
  [4,16,-8.3151,0,-3.4443,-6.3639,0,-6.3639,-5.6568,0,-5.6568,-7.3912,0,-3.0616],
// 4 16 -6.3639 0 -6.3639 -3.4443 0 -8.3151 -3.0616 0 -7.3912 -5.6568 0 -5.6568
  [4,16,-6.3639,0,-6.3639,-3.4443,0,-8.3151,-3.0616,0,-7.3912,-5.6568,0,-5.6568],
// 4 16 -3.4443 0 -8.3151 0 0 -9 0 0 -8 -3.0616 0 -7.3912
  [4,16,-3.4443,0,-8.3151,0,0,-9,0,0,-8,-3.0616,0,-7.3912],
// 4 16 0 0 -9 3.4443 0 -8.3151 3.0616 0 -7.3912 0 0 -8
  [4,16,0,0,-9,3.4443,0,-8.3151,3.0616,0,-7.3912,0,0,-8],
// 4 16 3.4443 0 -8.3151 6.3639 0 -6.3639 5.6568 0 -5.6568 3.0616 0 -7.3912
  [4,16,3.4443,0,-8.3151,6.3639,0,-6.3639,5.6568,0,-5.6568,3.0616,0,-7.3912],
// 4 16 6.3639 0 -6.3639 8.3151 0 -3.4443 7.3912 0 -3.0616 5.6568 0 -5.6568
  [4,16,6.3639,0,-6.3639,8.3151,0,-3.4443,7.3912,0,-3.0616,5.6568,0,-5.6568],
// 4 16 8.3151 0 -3.4443 9 0 0 8 0 0 7.3912 0 -3.0616
  [4,16,8.3151,0,-3.4443,9,0,0,8,0,0,7.3912,0,-3.0616],
];
module ldraw_lib__4_4ring8(step=0, col=false, unit=2/5, alt=false, line=0.2, solid=!$preview)
    makepoly(ldraw_lib__4_4ring8(), step=step, col=col, unit=unit, alt=alt, line=line, solid=solid);
ldraw_lib__4_4ring8(line=0.2);
// file: ../p/4-4cylo.scad
use <../lib.scad>
use <4-4cyli.scad>
use <4-4edge.scad>
function ldraw_lib__4_4cylo() = [
// 0 Cylinder Open 1.0
// 0 Name: 4-4cylo.dat
// 0 Author: Mark Kennedy [mkennedy]
// 0 !LDRAW_ORG Primitive UPDATE 2010-01
// 0 !LICENSE Licensed under CC BY 4.0 : see CAreadme.txt
// 
// 0 BFC CERTIFY CCW
  [0,"BFC","CERTIFY"],
  [0,"BFC","CCW"],
// 
// 0 !HISTORY 2010-04-05 [PTadmin] Official Update 2010-01
// 
// 
// 1 16 0 0 0 1 0 0 0 1 0 0 0 1 4-4edge.dat
  [1,16,0,0,0,1,0,0,0,1,0,0,0,1, ldraw_lib__4_4edge()],
// 1 16 0 1 0 1 0 0 0 1 0 0 0 1 4-4edge.dat
  [1,16,0,1,0,1,0,0,0,1,0,0,0,1, ldraw_lib__4_4edge()],
// 1 16 0 0 0 1 0 0 0 1 0 0 0 1 4-4cyli.dat
  [1,16,0,0,0,1,0,0,0,1,0,0,0,1, ldraw_lib__4_4cyli()],
// 0
];
module ldraw_lib__4_4cylo(step=0, col=false, unit=2/5, alt=false, line=0.2, solid=!$preview)
    makepoly(ldraw_lib__4_4cylo(), step=step, col=col, unit=unit, alt=alt, line=line, solid=solid);
ldraw_lib__4_4cylo(line=0.2);
// file: ../p/1-8chrd.scad
use <../lib.scad>
function ldraw_lib__1_8chrd() = [
// 0 Chord 0.125
// 0 Name: 1-8chrd.dat
// 0 Author: Orion Pobursky [OrionP]
// 0 !LDRAW_ORG Primitive UPDATE 2023-05
// 0 !LICENSE Licensed under CC BY 4.0 : see CAreadme.txt
// 
// 0 BFC CERTIFY CCW
  [0,"BFC","CERTIFY"],
  [0,"BFC","CCW"],
// 
// 0 !HISTORY 2004-04-22 [PTadmin] Official Update 2004-02
// 0 !HISTORY 2007-06-22 [PTadmin] Header formatted for Contributor Agreement
// 0 !HISTORY 2008-07-01 [PTadmin] Official Update 2008-01
// 0 !HISTORY 2023-10-27 [OrionP] Rebuilt with PrimGen2, original author westrate
// 0 !HISTORY 2023-10-31 [OrionP] Official Update 2023-05
// 
// 3 16 1 0 0 0.9239 0 0.3827 0.7071 0 0.7071
  [3,16,1,0,0,0.9239,0,0.3827,0.7071,0,0.7071],
];
module ldraw_lib__1_8chrd(step=0, col=false, unit=2/5, alt=false, line=0.2, solid=!$preview)
    makepoly(ldraw_lib__1_8chrd(), step=step, col=col, unit=unit, alt=alt, line=line, solid=solid);
ldraw_lib__1_8chrd(line=0.2);
// file: s/98138s02.scad
use <../../lib.scad>
use <../../p/4-4cylo.scad>
use <../../p/4-4ring8.scad>
use <../../p/4-4ring9.scad>
use <../../p/stud4o.scad>
function ldraw_lib__s__98138s02() = [
// 0 ~Tile  1 x  1 Round with Groove without Complete Top Face
// 0 Name: s\98138s02.dat
// 0 Author: Magnus Forsberg [MagFors]
// 0 !LDRAW_ORG Subpart UPDATE 2020-01
// 0 !LICENSE Licensed under CC BY 4.0 : see CAreadme.txt
// 
// 0 BFC CERTIFY CCW
  [0,"BFC","CERTIFY"],
  [0,"BFC","CCW"],
// 
// 0 !HISTORY 2020-06-28 [PTadmin] Official Update 2020-01
// 
// 
// 1 16 0 4 0 1 0 0 0 -1 0 0 0 1 stud4o.dat
  [1,16,0,4,0,1,0,0,0,-1,0,0,0,1, ldraw_lib__stud4o()],
// 1 16 0 8 0 -1 0 0 0 -1 0 0 0 1 4-4ring8.dat
  [1,16,0,8,0,-1,0,0,0,-1,0,0,0,1, ldraw_lib__4_4ring8()],
// 1 16 0 7 0 9 0 0 0 1 0 0 0 9 4-4cylo.dat
  [1,16,0,7,0,9,0,0,0,1,0,0,0,9, ldraw_lib__4_4cylo()],
// 1 16 0 7 0 -1 0 0 0 -1 0 0 0 1 4-4ring9.dat
  [1,16,0,7,0,-1,0,0,0,-1,0,0,0,1, ldraw_lib__4_4ring9()],
// 1 16 0 0 0 10 0 0 0 7 0 0 0 10 4-4cylo.dat
  [1,16,0,0,0,10,0,0,0,7,0,0,0,10, ldraw_lib__4_4cylo()],
];
module ldraw_lib__s__98138s02(step=0, col=false, unit=2/5, alt=false, line=0.2, solid=!$preview)
    makepoly(ldraw_lib__s__98138s02(), step=step, col=col, unit=unit, alt=alt, line=line, solid=solid);
ldraw_lib__s__98138s02(line=0.2);
// file: ../p/4-4ring9.scad
use <../lib.scad>
function ldraw_lib__4_4ring9() = [
// 0 Ring  9 x 1.0
// 0 Name: 4-4ring9.dat
// 0 Author: Magnus Forsberg [MagFors]
// 0 !LDRAW_ORG Primitive UPDATE 2024-01
// 0 !LICENSE Licensed under CC BY 4.0 : see CAreadme.txt
// 
// 0 BFC CERTIFY CCW
  [0,"BFC","CERTIFY"],
  [0,"BFC","CCW"],
// 
// 0 !HISTORY 2004-04-22 [PTadmin] Official Update 2004-02
// 0 !HISTORY 2007-06-24 [PTadmin] Header formatted for Contributor Agreement
// 0 !HISTORY 2008-07-01 [PTadmin] Official Update 2008-01
// 0 !HISTORY 2024-01-04 [MagFors] Complete regeneration, original by jriley
// 0 !HISTORY 2024-01-29 [OrionP] Official Update 2024-01
// 
// 4 16 10 0 0 9.239 0 3.827 8.3151 0 3.4443 9 0 0
  [4,16,10,0,0,9.239,0,3.827,8.3151,0,3.4443,9,0,0],
// 4 16 9.239 0 3.827 7.071 0 7.071 6.3639 0 6.3639 8.3151 0 3.4443
  [4,16,9.239,0,3.827,7.071,0,7.071,6.3639,0,6.3639,8.3151,0,3.4443],
// 4 16 7.071 0 7.071 3.827 0 9.239 3.4443 0 8.3151 6.3639 0 6.3639
  [4,16,7.071,0,7.071,3.827,0,9.239,3.4443,0,8.3151,6.3639,0,6.3639],
// 4 16 3.827 0 9.239 0 0 10 0 0 9 3.4443 0 8.3151
  [4,16,3.827,0,9.239,0,0,10,0,0,9,3.4443,0,8.3151],
// 4 16 0 0 10 -3.827 0 9.239 -3.4443 0 8.3151 0 0 9
  [4,16,0,0,10,-3.827,0,9.239,-3.4443,0,8.3151,0,0,9],
// 4 16 -3.827 0 9.239 -7.071 0 7.071 -6.3639 0 6.3639 -3.4443 0 8.3151
  [4,16,-3.827,0,9.239,-7.071,0,7.071,-6.3639,0,6.3639,-3.4443,0,8.3151],
// 4 16 -7.071 0 7.071 -9.239 0 3.827 -8.3151 0 3.4443 -6.3639 0 6.3639
  [4,16,-7.071,0,7.071,-9.239,0,3.827,-8.3151,0,3.4443,-6.3639,0,6.3639],
// 4 16 -9.239 0 3.827 -10 0 0 -9 0 0 -8.3151 0 3.4443
  [4,16,-9.239,0,3.827,-10,0,0,-9,0,0,-8.3151,0,3.4443],
// 4 16 -10 0 0 -9.239 0 -3.827 -8.3151 0 -3.4443 -9 0 0
  [4,16,-10,0,0,-9.239,0,-3.827,-8.3151,0,-3.4443,-9,0,0],
// 4 16 -9.239 0 -3.827 -7.071 0 -7.071 -6.3639 0 -6.3639 -8.3151 0 -3.4443
  [4,16,-9.239,0,-3.827,-7.071,0,-7.071,-6.3639,0,-6.3639,-8.3151,0,-3.4443],
// 4 16 -7.071 0 -7.071 -3.827 0 -9.239 -3.4443 0 -8.3151 -6.3639 0 -6.3639
  [4,16,-7.071,0,-7.071,-3.827,0,-9.239,-3.4443,0,-8.3151,-6.3639,0,-6.3639],
// 4 16 -3.827 0 -9.239 0 0 -10 0 0 -9 -3.4443 0 -8.3151
  [4,16,-3.827,0,-9.239,0,0,-10,0,0,-9,-3.4443,0,-8.3151],
// 4 16 0 0 -10 3.827 0 -9.239 3.4443 0 -8.3151 0 0 -9
  [4,16,0,0,-10,3.827,0,-9.239,3.4443,0,-8.3151,0,0,-9],
// 4 16 3.827 0 -9.239 7.071 0 -7.071 6.3639 0 -6.3639 3.4443 0 -8.3151
  [4,16,3.827,0,-9.239,7.071,0,-7.071,6.3639,0,-6.3639,3.4443,0,-8.3151],
// 4 16 7.071 0 -7.071 9.239 0 -3.827 8.3151 0 -3.4443 6.3639 0 -6.3639
  [4,16,7.071,0,-7.071,9.239,0,-3.827,8.3151,0,-3.4443,6.3639,0,-6.3639],
// 4 16 9.239 0 -3.827 10 0 0 9 0 0 8.3151 0 -3.4443
  [4,16,9.239,0,-3.827,10,0,0,9,0,0,8.3151,0,-3.4443],
// 0 // Build by LDPartEditor (PrimGen 2.X)
];
module ldraw_lib__4_4ring9(step=0, col=false, unit=2/5, alt=false, line=0.2, solid=!$preview)
    makepoly(ldraw_lib__4_4ring9(), step=step, col=col, unit=unit, alt=alt, line=line, solid=solid);
ldraw_lib__4_4ring9(line=0.2);
// main file
use <../lib.scad>
use <../p/4-4ring9.scad>
use <s/98138p0us01.scad>
use <s/98138s02.scad>
function ldraw_lib__98138p0u() = [
// 0 Tile  1 x  1 Round with Round Coral Strawberry Pattern
// 0 Name: 98138p0u.dat
// 0 Author: Philippe Hurbain [Philo]
// 0 !LDRAW_ORG Part UPDATE 2020-02
// 0 !LICENSE Licensed under CC BY 4.0 : see CAreadme.txt
// 
// 0 BFC CERTIFY CCW
  [0,"BFC","CERTIFY"],
  [0,"BFC","CCW"],
// 
// 0 !KEYWORDS Bricklink 98138pb133, Dots, Rebrickable 98138pr0139, Set DOTS-SERIES
// 
// 0 !HISTORY 2020-09-05 [PTadmin] Official Update 2020-02
// 
// 
// 1 16 0 0 0 1 0 0 0 1 0 0 0 1 s\98138s02.dat
  [1,16,0,0,0,1,0,0,0,1,0,0,0,1, ldraw_lib__s__98138s02()],
// 1 16 0 0 0 1 0 0 0 1 0 0 0 1 4-4ring9.dat
  [1,16,0,0,0,1,0,0,0,1,0,0,0,1, ldraw_lib__4_4ring9()],
// 1 16 0 0 0 1 0 0 0 1 0 0 0 1 s\98138p0us01.dat
  [1,16,0,0,0,1,0,0,0,1,0,0,0,1, ldraw_lib__s__98138p0us01()],
// 1 16 0 0 0 -1 0 0 0 1 0 0 0 1 s\98138p0us01.dat
  [1,16,0,0,0,-1,0,0,0,1,0,0,0,1, ldraw_lib__s__98138p0us01()],
];
module ldraw_lib__98138p0u(step=0, col=false, unit=2/5, alt=false, line=0.2, solid=!$preview)
    makepoly(ldraw_lib__98138p0u(), step=step, col=col, unit=unit, alt=alt, line=line, solid=solid);
ldraw_lib__98138p0u(line=0.2);
